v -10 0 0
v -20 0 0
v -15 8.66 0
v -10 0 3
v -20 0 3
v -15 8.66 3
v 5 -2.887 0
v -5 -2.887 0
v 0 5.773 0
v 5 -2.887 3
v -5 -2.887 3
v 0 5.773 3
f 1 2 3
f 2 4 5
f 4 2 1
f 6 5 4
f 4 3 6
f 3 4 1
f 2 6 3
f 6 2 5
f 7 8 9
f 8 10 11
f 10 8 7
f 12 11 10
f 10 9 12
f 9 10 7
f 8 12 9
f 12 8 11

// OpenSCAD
module equilateral_triangle(x, h, centered=false)
{
  r = x / 2 / cos(180/3/2);
  b = 360/3;
  c = centered ? 0 : 1;

  translate(c*[x/2, x*sin(180/3) - r, 0])
    linear_extrude(h)
    polygon([ [        0, r       ],
              [+r*sin(b), r*cos(b)],
              [-r*sin(b), r*cos(b)],
            ]);
}


translate([-20, 0, 0])
  equilateral_triangle(10, 3);

equilateral_triangle(10, 3, centered=true);
